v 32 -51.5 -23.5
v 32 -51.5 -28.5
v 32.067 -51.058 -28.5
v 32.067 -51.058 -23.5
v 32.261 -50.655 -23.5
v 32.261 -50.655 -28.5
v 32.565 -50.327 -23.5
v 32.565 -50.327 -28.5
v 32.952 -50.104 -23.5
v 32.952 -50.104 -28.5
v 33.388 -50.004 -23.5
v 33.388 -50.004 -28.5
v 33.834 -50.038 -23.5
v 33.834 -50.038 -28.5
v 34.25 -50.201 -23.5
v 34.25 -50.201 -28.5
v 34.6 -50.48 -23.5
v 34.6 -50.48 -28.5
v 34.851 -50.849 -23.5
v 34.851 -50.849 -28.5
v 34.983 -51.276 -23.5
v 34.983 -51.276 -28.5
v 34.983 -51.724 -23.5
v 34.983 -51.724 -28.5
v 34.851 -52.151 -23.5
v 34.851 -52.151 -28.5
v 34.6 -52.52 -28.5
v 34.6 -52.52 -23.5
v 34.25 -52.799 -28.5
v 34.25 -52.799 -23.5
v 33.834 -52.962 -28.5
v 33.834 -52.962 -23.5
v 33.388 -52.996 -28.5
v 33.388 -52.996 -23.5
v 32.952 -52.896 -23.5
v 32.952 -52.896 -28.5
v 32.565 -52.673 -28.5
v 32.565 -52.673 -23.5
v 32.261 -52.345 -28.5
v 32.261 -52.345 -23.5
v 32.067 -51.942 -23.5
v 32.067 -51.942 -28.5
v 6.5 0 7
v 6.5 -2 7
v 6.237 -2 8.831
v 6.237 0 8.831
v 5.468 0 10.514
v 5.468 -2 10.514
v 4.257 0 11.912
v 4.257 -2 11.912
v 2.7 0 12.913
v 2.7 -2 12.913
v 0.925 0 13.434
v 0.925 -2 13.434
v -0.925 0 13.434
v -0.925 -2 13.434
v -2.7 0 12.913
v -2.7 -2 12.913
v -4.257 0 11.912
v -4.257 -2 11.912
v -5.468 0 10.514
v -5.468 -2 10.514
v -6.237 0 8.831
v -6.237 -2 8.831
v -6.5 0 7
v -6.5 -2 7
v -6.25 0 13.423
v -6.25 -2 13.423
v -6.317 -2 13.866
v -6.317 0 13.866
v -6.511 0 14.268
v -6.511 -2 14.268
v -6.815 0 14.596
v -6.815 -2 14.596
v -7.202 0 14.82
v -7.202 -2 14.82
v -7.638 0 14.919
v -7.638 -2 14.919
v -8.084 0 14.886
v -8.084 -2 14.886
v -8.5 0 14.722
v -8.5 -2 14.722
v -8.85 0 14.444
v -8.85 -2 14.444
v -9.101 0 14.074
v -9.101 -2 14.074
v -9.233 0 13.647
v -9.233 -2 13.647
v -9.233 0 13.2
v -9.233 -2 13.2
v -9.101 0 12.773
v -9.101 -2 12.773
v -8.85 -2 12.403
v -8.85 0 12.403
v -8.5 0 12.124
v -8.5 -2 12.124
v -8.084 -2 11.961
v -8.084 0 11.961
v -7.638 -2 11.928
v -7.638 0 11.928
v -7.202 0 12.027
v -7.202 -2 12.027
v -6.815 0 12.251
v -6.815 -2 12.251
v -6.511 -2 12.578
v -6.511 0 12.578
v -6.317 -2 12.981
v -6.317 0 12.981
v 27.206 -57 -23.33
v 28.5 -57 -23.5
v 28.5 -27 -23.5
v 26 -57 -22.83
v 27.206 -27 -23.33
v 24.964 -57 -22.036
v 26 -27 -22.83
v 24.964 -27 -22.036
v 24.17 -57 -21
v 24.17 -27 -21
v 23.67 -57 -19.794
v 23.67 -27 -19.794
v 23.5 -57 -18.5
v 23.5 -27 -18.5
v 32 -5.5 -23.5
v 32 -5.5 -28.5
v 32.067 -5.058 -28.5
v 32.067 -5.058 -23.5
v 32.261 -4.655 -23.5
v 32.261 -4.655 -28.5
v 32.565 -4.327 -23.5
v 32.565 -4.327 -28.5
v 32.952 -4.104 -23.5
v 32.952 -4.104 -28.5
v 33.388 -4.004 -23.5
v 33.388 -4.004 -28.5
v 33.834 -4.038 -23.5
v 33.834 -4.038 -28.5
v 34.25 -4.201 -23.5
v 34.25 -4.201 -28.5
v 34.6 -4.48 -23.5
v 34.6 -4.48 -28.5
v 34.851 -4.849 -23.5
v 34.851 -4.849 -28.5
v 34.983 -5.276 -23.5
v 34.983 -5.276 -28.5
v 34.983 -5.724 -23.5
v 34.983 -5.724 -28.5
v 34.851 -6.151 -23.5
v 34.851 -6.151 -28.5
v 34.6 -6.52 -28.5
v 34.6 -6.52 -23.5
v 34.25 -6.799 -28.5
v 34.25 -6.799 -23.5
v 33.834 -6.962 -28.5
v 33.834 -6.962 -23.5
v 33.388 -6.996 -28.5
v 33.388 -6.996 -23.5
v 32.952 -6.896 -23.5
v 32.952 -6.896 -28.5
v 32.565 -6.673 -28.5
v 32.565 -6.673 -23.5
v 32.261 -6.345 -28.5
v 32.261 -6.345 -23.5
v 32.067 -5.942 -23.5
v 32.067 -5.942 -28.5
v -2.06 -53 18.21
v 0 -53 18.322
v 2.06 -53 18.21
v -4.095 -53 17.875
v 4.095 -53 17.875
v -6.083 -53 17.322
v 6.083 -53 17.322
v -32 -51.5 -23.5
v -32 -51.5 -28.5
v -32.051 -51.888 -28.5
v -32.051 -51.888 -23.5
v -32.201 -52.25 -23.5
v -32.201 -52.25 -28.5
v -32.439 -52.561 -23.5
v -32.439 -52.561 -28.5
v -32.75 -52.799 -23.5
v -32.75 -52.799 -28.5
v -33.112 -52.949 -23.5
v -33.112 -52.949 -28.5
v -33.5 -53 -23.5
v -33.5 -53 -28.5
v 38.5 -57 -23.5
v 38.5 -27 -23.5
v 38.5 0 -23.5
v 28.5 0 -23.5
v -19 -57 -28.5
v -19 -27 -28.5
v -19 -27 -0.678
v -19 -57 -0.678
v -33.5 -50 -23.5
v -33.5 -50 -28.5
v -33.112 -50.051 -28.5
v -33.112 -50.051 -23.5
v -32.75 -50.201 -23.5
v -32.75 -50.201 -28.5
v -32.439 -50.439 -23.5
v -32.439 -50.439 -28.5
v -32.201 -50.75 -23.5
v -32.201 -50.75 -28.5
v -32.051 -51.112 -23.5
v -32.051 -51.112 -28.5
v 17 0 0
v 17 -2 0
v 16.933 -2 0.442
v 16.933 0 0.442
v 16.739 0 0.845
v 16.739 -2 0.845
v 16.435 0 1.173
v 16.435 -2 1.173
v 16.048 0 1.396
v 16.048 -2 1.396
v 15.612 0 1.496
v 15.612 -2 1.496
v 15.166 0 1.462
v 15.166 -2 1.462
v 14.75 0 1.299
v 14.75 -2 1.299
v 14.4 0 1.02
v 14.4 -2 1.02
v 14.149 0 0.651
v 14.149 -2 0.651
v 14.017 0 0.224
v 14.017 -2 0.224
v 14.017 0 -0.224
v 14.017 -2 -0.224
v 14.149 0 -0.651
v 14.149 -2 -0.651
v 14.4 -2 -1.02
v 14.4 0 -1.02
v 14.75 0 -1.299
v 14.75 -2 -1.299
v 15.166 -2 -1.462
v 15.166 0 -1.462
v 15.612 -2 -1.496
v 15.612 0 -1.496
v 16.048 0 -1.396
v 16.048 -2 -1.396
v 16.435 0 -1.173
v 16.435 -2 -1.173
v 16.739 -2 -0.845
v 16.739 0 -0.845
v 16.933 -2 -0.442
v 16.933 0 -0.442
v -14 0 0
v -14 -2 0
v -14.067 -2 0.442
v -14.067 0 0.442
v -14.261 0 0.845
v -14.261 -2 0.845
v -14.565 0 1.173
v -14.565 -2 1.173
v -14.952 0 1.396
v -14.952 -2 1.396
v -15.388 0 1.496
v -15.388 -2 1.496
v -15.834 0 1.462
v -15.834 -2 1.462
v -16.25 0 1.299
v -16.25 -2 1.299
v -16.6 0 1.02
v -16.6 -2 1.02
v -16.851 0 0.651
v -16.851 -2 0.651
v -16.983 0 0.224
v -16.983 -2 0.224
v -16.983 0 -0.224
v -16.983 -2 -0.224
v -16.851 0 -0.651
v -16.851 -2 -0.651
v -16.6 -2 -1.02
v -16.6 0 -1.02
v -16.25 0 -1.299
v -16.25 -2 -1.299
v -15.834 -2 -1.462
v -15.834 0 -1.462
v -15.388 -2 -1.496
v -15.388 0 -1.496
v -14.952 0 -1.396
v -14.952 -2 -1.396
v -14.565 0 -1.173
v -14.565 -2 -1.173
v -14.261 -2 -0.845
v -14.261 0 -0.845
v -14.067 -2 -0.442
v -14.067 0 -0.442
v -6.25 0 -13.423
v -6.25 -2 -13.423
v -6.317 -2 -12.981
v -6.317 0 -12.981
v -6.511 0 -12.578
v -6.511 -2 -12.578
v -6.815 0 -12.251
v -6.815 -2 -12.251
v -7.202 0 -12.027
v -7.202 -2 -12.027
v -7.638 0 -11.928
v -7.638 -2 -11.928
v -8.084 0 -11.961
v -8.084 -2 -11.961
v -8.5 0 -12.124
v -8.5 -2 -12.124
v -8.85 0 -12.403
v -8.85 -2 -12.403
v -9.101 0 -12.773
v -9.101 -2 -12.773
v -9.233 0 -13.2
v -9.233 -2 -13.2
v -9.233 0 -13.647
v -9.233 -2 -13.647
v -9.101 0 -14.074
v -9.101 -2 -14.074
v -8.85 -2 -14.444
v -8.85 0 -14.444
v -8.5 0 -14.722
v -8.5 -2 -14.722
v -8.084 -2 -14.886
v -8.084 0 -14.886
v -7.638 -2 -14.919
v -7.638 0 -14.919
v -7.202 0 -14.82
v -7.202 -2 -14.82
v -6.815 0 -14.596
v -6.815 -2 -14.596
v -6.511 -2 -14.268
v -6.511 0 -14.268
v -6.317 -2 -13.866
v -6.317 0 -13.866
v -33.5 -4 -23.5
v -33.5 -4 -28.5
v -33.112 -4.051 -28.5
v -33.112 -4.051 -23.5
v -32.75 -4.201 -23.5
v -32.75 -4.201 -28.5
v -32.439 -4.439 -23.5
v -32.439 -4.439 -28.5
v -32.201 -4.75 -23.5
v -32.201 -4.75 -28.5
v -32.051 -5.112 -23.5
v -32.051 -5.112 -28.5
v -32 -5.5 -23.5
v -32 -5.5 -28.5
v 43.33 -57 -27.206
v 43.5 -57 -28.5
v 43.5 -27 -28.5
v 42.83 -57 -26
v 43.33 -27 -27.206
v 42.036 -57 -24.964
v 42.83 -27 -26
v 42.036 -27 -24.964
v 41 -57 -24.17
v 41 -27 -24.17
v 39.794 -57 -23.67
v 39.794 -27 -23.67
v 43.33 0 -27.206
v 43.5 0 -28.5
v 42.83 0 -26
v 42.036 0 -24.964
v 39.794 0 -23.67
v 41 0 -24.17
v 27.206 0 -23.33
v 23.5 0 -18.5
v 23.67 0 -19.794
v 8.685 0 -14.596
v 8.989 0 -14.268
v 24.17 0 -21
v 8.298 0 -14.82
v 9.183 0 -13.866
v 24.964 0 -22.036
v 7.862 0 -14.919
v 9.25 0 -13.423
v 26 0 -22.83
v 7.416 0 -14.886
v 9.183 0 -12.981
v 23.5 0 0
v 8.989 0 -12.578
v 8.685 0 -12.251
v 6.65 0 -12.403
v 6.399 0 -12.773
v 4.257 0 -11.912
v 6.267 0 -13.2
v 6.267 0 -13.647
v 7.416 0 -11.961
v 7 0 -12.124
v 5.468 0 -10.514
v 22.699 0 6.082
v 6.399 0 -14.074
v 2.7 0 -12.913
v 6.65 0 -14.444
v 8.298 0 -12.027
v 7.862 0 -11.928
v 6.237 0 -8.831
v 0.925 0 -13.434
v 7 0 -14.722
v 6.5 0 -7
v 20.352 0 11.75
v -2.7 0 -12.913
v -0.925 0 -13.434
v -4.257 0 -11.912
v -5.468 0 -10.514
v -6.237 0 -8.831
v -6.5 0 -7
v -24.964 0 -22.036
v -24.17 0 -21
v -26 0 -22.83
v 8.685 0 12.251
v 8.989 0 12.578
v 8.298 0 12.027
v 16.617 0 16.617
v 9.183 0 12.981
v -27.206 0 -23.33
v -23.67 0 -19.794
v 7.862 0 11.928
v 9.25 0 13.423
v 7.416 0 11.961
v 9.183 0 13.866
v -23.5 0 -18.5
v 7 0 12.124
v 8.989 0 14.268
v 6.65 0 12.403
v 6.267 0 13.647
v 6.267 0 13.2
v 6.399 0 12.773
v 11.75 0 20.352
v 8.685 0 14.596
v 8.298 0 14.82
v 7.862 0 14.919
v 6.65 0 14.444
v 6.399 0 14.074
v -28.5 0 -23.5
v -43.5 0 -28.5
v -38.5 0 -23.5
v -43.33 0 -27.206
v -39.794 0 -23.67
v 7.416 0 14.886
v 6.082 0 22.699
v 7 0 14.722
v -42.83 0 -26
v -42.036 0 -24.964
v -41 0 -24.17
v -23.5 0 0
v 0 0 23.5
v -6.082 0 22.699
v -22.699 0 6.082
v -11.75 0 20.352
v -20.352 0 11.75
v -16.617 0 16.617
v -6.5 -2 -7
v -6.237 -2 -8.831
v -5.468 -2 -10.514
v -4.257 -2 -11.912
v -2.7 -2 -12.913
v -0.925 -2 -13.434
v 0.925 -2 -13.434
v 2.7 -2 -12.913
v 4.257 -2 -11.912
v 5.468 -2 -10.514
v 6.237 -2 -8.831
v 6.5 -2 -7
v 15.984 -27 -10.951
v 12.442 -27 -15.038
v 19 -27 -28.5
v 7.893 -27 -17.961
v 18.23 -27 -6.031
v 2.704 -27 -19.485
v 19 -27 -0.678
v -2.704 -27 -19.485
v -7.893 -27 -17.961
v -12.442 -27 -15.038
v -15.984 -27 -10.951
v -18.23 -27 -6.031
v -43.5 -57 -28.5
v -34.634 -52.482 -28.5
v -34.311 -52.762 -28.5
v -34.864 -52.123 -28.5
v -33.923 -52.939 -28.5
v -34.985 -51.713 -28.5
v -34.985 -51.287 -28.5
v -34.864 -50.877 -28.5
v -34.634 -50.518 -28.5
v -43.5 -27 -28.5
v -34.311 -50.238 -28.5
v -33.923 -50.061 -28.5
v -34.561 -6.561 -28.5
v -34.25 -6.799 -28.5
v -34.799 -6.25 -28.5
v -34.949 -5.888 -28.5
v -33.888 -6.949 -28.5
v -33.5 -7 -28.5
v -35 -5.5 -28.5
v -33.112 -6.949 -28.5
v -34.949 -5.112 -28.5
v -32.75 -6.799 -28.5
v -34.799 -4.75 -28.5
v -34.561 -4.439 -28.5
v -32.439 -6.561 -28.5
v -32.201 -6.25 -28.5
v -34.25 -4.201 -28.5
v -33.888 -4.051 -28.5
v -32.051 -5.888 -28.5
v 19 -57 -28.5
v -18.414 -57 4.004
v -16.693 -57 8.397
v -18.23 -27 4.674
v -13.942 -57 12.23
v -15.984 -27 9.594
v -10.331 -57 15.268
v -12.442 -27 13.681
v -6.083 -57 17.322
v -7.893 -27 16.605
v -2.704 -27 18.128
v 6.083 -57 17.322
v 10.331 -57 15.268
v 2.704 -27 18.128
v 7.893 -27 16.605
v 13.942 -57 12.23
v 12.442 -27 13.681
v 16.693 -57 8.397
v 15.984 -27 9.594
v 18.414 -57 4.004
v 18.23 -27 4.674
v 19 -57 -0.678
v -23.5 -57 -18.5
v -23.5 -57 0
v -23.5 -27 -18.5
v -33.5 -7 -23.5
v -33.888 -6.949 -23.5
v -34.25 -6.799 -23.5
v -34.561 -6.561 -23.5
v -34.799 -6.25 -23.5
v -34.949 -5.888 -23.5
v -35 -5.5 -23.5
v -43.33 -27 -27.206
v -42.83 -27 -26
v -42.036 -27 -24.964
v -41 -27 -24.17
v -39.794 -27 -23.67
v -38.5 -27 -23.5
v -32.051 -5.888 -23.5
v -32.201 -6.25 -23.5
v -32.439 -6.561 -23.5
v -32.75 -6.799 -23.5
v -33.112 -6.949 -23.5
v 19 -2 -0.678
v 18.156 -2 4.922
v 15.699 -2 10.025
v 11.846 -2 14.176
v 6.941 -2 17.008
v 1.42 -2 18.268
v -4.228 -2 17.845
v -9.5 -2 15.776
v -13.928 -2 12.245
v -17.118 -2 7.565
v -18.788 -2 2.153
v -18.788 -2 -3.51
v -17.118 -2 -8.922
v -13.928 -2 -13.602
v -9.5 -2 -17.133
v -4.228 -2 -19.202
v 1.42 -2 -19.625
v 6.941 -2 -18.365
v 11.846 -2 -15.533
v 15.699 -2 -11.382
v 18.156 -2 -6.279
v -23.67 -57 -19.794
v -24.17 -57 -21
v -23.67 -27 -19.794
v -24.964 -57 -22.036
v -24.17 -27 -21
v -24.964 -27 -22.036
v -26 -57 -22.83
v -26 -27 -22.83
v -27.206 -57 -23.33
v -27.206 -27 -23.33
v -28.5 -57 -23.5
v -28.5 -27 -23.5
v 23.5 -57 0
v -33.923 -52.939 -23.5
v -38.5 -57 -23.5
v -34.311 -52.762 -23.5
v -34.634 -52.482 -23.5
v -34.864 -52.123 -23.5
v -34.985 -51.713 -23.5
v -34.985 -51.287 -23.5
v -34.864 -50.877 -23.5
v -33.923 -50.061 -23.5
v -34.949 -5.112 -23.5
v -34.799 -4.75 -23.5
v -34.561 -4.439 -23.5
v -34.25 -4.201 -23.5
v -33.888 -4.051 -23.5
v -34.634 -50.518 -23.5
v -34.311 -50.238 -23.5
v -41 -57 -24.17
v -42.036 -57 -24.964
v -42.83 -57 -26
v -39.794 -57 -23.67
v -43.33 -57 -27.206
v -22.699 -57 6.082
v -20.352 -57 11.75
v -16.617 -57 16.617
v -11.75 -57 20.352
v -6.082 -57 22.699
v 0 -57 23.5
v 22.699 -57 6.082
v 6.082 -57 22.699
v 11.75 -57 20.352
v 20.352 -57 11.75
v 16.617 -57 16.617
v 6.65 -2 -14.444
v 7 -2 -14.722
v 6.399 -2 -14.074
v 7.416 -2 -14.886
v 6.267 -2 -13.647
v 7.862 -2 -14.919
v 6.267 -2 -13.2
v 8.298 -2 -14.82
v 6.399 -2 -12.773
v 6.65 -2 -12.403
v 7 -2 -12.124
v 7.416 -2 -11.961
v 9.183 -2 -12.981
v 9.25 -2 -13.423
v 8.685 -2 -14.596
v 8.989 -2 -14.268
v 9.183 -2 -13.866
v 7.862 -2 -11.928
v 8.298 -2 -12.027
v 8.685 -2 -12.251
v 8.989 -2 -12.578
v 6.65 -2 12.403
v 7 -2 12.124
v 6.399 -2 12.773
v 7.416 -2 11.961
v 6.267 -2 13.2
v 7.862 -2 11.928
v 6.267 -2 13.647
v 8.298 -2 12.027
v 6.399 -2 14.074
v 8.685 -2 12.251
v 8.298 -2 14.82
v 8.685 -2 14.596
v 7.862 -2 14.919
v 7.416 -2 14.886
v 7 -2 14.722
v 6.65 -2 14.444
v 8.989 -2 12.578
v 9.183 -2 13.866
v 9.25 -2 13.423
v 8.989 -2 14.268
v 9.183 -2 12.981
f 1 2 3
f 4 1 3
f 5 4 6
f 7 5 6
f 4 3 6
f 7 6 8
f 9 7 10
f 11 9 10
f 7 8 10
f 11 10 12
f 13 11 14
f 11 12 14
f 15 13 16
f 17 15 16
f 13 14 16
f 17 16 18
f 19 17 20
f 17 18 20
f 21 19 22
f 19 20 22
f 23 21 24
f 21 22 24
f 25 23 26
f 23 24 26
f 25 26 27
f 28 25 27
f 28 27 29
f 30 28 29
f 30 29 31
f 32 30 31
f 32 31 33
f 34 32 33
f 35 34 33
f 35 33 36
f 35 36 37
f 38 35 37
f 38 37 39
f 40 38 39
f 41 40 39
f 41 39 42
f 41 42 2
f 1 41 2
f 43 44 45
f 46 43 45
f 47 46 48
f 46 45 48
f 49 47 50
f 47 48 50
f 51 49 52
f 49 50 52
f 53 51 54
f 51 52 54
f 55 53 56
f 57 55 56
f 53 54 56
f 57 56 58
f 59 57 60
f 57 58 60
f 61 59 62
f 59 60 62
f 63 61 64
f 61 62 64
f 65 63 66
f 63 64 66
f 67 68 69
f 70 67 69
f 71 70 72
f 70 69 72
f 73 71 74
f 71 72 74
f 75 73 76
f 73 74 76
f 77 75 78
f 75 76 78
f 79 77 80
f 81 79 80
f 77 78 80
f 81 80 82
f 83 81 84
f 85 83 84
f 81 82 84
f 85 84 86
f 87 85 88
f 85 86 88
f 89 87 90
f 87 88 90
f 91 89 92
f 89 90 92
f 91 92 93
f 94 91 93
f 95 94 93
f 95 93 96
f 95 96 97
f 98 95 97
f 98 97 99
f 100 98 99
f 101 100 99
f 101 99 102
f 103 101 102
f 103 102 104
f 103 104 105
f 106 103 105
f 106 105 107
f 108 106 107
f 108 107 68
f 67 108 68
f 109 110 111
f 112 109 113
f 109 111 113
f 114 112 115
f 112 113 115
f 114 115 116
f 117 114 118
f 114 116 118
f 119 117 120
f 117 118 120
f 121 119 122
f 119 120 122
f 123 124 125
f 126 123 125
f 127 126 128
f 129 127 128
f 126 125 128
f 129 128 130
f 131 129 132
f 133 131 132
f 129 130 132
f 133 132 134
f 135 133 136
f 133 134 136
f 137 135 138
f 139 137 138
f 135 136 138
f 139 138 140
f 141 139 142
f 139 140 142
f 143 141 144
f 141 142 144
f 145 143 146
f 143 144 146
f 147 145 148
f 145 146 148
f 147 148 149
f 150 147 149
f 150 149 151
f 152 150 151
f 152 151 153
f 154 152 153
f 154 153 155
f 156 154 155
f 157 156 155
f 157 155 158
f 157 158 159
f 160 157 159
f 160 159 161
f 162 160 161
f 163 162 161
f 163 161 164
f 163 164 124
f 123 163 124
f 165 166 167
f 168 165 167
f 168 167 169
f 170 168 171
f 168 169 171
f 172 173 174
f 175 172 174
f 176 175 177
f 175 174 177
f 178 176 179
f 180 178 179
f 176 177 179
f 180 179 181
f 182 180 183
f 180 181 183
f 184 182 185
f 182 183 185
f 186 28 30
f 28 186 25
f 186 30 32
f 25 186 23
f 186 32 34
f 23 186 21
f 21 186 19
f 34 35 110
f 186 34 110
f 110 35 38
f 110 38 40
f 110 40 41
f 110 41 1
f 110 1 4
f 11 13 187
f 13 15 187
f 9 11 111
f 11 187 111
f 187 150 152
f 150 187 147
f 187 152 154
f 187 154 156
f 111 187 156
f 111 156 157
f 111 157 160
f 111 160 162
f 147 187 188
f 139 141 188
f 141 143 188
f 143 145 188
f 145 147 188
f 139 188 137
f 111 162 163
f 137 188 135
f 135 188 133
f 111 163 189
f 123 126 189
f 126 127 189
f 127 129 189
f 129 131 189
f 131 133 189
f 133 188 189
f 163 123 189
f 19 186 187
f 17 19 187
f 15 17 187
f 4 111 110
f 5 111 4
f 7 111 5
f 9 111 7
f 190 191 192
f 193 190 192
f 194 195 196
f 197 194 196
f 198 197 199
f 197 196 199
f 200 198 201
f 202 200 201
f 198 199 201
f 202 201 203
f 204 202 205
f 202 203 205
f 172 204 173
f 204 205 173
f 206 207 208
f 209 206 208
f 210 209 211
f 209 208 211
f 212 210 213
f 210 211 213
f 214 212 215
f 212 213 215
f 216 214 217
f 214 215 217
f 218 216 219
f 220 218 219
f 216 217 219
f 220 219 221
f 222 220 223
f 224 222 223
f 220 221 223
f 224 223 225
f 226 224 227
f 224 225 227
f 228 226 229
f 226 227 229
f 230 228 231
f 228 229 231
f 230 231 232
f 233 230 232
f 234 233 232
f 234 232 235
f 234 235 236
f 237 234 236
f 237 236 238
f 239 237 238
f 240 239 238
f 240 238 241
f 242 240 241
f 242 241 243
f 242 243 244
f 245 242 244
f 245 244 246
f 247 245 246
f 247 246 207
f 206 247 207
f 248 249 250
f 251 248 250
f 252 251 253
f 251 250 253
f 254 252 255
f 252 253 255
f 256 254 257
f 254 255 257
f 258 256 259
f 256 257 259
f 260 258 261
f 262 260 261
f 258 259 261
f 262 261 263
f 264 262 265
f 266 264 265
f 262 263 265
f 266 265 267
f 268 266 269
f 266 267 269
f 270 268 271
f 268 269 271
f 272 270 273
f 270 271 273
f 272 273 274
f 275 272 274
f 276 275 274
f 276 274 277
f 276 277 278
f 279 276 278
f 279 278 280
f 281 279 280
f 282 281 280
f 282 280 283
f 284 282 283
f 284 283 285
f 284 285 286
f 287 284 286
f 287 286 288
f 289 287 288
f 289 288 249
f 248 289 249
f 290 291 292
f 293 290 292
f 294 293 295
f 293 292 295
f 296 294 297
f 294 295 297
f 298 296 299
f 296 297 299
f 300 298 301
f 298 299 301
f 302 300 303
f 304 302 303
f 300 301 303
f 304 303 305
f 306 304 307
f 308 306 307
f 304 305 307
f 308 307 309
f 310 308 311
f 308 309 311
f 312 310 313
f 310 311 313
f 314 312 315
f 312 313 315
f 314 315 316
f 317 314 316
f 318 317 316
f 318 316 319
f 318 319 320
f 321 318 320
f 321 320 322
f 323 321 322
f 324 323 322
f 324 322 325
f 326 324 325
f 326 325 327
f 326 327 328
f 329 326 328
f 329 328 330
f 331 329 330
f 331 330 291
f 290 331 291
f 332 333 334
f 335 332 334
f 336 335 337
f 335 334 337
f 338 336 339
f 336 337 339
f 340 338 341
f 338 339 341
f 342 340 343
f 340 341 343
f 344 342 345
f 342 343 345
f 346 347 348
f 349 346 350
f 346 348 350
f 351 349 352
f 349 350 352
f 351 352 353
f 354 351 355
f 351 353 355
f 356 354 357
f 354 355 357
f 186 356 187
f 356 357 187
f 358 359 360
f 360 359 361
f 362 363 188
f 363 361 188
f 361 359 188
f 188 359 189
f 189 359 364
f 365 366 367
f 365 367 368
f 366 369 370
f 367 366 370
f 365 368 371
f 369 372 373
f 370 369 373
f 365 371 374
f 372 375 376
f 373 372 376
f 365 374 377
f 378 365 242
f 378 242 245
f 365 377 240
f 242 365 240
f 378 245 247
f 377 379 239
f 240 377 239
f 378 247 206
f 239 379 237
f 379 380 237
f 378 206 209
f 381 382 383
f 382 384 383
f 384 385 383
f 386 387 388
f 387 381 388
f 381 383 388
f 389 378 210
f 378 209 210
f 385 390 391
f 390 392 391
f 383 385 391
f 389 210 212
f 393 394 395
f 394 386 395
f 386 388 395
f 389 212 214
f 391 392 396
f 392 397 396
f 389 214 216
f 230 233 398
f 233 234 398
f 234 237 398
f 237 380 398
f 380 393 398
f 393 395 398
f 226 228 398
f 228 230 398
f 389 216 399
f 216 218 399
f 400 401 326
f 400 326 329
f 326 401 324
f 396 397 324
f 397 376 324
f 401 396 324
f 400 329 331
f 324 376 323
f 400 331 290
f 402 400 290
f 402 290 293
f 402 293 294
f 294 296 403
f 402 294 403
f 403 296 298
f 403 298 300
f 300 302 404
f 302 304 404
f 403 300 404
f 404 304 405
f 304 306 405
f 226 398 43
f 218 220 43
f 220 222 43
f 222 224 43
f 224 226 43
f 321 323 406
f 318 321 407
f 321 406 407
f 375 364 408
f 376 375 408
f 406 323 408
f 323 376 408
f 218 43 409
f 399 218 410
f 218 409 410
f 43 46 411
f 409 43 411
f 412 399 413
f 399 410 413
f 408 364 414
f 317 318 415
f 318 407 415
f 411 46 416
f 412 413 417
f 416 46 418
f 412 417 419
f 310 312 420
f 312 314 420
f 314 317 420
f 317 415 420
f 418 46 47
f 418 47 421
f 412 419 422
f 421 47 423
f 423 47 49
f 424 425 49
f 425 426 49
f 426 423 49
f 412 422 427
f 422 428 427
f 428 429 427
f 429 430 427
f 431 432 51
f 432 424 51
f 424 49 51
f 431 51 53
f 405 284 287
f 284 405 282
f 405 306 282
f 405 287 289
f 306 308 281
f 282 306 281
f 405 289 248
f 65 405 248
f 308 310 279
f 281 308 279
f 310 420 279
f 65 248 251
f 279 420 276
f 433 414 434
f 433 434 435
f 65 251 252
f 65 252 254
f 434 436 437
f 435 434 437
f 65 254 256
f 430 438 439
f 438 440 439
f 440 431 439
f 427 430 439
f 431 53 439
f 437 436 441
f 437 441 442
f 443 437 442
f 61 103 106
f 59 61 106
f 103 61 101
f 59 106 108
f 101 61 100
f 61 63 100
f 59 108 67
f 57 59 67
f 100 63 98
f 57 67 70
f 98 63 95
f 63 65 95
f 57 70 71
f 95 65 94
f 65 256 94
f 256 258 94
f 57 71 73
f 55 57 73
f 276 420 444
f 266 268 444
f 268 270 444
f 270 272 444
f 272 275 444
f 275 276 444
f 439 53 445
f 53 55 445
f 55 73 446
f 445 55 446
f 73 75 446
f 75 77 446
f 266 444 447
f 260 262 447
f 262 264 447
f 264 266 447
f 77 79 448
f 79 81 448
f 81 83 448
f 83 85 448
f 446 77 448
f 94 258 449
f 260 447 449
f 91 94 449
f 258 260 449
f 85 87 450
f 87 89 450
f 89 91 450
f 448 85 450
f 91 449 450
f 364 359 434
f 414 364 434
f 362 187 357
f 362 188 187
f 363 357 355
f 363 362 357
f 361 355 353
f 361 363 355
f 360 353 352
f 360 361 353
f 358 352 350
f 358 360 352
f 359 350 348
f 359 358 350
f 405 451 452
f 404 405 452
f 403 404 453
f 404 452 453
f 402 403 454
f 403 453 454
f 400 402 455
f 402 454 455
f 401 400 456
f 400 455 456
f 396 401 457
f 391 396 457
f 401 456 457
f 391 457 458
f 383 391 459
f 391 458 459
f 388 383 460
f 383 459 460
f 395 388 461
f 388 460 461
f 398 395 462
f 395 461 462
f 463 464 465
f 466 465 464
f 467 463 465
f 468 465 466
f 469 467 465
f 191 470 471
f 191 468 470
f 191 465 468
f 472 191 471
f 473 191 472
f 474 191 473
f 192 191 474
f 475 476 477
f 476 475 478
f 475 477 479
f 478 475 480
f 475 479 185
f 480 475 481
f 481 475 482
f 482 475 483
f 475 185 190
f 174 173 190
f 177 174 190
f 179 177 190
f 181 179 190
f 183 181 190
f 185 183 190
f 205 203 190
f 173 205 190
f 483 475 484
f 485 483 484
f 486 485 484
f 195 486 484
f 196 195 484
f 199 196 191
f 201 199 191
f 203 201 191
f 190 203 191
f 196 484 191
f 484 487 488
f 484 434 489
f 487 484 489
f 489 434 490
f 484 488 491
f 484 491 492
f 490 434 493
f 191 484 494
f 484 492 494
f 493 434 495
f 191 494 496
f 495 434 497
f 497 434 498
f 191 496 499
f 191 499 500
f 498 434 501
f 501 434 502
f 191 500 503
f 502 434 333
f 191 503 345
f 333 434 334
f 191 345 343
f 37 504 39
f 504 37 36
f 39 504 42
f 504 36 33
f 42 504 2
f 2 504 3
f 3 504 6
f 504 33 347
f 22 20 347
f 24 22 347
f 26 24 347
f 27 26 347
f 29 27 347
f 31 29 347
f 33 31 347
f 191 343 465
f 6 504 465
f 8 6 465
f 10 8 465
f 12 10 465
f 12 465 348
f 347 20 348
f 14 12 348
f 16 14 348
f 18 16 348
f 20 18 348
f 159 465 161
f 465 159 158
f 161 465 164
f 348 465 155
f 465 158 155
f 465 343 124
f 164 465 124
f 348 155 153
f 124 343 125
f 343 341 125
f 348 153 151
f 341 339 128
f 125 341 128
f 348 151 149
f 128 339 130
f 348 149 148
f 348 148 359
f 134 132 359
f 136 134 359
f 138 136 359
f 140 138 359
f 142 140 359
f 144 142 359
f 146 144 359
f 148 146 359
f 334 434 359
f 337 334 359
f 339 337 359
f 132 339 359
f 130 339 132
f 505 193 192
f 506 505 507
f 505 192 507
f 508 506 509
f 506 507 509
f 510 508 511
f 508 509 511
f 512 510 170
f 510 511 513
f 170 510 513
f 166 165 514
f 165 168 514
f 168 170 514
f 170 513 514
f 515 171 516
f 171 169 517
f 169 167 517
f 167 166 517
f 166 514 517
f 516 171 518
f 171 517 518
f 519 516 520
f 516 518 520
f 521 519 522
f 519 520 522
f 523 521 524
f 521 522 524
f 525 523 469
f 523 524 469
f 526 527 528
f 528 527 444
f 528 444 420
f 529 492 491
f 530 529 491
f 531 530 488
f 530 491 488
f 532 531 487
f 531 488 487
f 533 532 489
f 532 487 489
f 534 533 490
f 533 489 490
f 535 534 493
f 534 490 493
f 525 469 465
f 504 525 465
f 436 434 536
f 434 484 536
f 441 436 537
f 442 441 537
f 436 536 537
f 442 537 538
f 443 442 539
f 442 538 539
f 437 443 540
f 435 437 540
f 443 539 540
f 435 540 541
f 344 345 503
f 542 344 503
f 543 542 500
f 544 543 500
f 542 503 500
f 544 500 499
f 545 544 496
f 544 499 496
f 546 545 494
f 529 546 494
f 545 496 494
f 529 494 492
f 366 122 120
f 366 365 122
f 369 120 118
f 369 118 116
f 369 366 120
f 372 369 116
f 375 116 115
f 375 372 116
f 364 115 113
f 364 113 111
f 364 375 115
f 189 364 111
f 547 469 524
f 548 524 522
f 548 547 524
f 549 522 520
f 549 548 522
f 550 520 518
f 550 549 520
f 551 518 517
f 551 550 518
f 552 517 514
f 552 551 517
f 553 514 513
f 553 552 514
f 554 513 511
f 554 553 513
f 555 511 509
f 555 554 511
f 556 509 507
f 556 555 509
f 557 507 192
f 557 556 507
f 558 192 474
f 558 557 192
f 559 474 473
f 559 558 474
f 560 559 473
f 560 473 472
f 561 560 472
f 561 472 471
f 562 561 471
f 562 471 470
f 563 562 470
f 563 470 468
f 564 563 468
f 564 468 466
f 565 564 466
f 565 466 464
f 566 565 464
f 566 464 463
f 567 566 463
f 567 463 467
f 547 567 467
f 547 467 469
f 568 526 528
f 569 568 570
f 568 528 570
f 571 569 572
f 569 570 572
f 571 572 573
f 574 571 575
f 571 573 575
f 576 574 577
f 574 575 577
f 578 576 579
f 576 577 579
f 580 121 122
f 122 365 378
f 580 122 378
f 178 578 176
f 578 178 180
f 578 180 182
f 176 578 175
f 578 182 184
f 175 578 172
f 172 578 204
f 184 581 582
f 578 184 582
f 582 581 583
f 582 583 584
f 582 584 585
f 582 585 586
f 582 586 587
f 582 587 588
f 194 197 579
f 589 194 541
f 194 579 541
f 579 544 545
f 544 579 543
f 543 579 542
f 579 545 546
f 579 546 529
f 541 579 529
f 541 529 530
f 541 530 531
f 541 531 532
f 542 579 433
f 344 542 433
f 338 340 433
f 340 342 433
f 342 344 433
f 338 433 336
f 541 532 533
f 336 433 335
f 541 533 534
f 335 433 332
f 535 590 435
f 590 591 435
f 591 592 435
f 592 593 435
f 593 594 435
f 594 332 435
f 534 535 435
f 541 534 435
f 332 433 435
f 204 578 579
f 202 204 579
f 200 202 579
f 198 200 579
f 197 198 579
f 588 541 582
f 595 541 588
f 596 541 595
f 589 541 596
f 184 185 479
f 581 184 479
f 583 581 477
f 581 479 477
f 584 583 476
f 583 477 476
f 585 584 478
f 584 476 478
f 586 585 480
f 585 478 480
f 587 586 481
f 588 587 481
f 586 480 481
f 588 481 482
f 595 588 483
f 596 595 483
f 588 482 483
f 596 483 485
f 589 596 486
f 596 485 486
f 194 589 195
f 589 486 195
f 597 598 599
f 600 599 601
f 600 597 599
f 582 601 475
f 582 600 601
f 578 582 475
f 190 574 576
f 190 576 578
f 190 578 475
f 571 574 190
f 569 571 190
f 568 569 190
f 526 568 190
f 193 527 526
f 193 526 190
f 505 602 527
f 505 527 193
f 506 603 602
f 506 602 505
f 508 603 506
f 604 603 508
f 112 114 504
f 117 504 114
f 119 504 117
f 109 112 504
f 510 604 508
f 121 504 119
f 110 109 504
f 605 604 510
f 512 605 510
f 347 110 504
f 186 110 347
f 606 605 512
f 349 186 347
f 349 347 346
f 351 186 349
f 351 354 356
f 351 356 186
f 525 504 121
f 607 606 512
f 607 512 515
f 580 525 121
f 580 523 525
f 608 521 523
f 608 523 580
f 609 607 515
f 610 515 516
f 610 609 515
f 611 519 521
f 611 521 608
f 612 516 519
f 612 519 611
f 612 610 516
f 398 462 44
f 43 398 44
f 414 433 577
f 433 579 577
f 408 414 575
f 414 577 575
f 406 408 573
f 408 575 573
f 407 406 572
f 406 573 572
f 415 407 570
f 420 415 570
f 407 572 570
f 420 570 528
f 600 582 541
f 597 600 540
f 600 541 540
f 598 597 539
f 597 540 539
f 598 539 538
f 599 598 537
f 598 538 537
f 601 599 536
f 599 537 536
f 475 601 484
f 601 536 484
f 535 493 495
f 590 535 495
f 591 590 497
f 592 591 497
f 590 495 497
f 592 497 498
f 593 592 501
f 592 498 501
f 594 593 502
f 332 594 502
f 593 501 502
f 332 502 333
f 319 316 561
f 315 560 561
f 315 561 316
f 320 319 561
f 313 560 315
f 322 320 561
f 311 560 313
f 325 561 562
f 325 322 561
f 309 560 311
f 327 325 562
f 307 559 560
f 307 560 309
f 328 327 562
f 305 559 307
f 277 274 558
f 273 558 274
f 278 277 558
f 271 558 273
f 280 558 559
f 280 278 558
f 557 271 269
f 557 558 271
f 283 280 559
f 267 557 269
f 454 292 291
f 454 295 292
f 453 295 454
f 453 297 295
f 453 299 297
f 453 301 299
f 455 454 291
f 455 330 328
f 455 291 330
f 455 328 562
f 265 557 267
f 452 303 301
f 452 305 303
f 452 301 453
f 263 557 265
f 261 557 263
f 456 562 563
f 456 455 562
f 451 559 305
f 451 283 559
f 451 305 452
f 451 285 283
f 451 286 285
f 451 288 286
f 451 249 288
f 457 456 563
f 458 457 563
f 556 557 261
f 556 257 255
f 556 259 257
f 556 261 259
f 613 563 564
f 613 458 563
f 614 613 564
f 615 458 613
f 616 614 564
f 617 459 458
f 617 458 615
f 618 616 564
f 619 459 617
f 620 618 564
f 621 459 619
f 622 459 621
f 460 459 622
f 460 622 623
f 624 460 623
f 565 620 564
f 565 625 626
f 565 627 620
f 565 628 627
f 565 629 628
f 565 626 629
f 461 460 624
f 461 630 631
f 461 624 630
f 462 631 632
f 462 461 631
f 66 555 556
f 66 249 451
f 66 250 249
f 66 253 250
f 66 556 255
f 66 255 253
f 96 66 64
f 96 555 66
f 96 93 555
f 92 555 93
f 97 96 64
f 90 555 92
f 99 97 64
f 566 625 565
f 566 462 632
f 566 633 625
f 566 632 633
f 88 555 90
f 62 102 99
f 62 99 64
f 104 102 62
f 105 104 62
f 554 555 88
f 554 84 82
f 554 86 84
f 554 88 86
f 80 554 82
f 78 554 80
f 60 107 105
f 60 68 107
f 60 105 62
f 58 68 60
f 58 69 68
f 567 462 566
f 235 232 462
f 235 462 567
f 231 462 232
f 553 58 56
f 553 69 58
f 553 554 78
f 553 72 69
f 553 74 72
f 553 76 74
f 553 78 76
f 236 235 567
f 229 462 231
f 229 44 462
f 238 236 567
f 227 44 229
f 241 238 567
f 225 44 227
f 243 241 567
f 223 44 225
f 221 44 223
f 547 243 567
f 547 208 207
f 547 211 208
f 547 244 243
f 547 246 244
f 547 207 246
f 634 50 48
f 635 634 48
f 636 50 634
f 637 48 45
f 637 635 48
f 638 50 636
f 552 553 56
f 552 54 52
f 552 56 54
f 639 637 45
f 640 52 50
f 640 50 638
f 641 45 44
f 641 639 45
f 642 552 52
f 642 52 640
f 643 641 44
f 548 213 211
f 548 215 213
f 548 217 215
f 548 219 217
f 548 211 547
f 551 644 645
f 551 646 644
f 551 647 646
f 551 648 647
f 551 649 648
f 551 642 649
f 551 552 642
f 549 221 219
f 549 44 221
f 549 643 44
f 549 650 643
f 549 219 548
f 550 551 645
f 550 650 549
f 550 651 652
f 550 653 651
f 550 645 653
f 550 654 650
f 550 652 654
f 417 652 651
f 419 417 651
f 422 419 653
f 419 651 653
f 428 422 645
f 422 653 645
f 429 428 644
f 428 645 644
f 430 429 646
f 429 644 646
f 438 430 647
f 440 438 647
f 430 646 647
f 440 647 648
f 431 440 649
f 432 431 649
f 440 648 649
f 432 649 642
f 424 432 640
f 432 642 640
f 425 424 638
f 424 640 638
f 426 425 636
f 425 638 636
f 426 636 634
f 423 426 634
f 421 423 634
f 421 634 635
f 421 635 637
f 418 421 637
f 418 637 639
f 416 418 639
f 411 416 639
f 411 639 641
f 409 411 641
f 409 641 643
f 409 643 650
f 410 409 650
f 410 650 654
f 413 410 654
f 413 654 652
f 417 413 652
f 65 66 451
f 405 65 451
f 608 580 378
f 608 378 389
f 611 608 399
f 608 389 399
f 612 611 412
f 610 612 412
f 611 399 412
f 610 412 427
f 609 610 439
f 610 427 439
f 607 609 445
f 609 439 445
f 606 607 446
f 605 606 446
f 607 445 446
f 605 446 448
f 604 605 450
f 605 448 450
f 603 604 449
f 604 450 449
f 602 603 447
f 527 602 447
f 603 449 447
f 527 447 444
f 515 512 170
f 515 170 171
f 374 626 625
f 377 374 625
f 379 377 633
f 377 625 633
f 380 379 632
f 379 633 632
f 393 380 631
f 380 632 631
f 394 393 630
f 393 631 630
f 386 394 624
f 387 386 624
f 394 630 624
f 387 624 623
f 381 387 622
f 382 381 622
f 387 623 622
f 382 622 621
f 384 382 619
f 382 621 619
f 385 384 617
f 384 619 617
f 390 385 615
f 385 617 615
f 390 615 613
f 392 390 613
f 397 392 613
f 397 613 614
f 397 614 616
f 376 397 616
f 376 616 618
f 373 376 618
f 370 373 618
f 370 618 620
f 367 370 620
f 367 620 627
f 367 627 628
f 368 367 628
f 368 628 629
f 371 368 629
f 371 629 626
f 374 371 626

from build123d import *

# Parameters (mm, degrees)
F1_DEPTH  = 2
F2_R      = 1.5
F3_DEPTH  = 5
F4_R      = 19
F5_DEPTH  = 27
F6_W      = 47
F6_H      = 27
F7_DEPTH  = 5
F8_W      = 27
F8_H      = 5
F9_DEPTH  = 20
F10_W     = 27
F10_H     = 5
F11_DEPTH = 20
F12_R     = 4.99999
F14_DEPTH = 30
F16_DEPTH = 4
F18_DEPTH = 25


# Not quite as in the source:
# - a fillet or chamfer is up to 0.001 mm smaller than in the source, because OpenCascade refuses the exact size


with BuildPart() as f1:
    # F0 (on Front) → F1 (new body)
    with BuildSketch(Plane.XZ):
        with BuildLine():
            Line((-23.5, -23.5), (0, -23.5))
            Line((0, -23.5), (23.5, -23.5))
            Line((23.5, -23.5), (23.5, 0))
            ThreePointArc((23.5, 0), (0, 23.5), (-23.5, 0))
            Line((-23.5, 0), (-23.5, -23.5))
        make_face()
    extrude(amount=F1_DEPTH)

    # F2 (on face) → F3 (cut)
    with BuildSketch(Plane.XZ.offset(2)):
        with Locations((15.5, 0)):
            Circle(F2_R)
        with Locations((7.75, 13.4233937587)):
            Circle(F2_R)
        with Locations((-7.75, 13.4233937587)):
            Circle(F2_R)
        with Locations((-15.5, 0)):
            Circle(F2_R)
        with Locations((-7.75, -13.4233937587)):
            Circle(F2_R)
        with Locations((7.75, -13.4233937587)):
            Circle(F2_R)
        with BuildLine():
            Line((6.5, -7), (6.5, 7))
            ThreePointArc((6.5, 7), (0, 13.5), (-6.5, 7))
            Line((-6.5, 7), (-6.5, -7))
            ThreePointArc((-6.5, -7), (0, -13.5), (6.5, -7))
        make_face()
    extrude(amount=-F3_DEPTH, mode=Mode.SUBTRACT)

    # F4 (on Front) → F5 (join)
    with BuildSketch(Plane.XZ):
        with BuildLine():
            ThreePointArc((23.5, 0), (0, 23.5), (-23.5, 0))
            Line((-23.5, 0), (-23.5, -23.5))
            Line((-23.5, -23.5), (23.5, -23.5))
            Line((23.5, -23.5), (23.5, 0))
        make_face()
        with Locations((0, -0.6784388353)):
            Circle(F4_R, mode=Mode.SUBTRACT)
    extrude(amount=F5_DEPTH)

    # F6 (on face) → F7 (join)
    with BuildSketch(Plane(origin=(0, 0, -23.5), x_dir=(1, 0, 0), z_dir=(0, 0, -1))):
        with Locations((0, 13.5)):
            Rectangle(F6_W, F6_H)
    extrude(amount=F7_DEPTH)

    # F8 (on face) → F9 (join)
    with BuildSketch(Plane(origin=(-23.5, 0, 0), x_dir=(0, -1, 0), z_dir=(-1, 0, 0))):
        with Locations((13.5, -26)):
            Rectangle(F8_W, F8_H)
    extrude(amount=F9_DEPTH)

    # F10 (on face) → F11 (join)
    with BuildSketch(Plane.YZ.offset(23.5)):
        with Locations((-13.5, -26)):
            Rectangle(F10_W, F10_H)
    extrude(amount=F11_DEPTH)

    # F12 (radius 5 in the source; OpenCascade refuses exactly that, so slightly less here)
    f12_edges = [f1.edges().sort_by_distance(p)[0] for p in [
        (23.5, -13.5, -23.5),
        (43.5, -13.5, -23.5),
        (-23.5, -13.5, -23.5),
        (-43.5, -13.5, -23.5),
    ]]
    fillet(f12_edges, radius=F12_R)

    # F13 (on face) → F14 (join)
    with BuildSketch(Plane.XZ.offset(27)):
        with BuildLine():
            Line((23.5, -18.5), (23.5, 0))
            ThreePointArc((23.5, 0), (0, 23.5), (-23.5, 0))
            Line((-23.5, 0), (-23.5, -18.5))
            ThreePointArc((-23.5, -18.5), (-24.9644660941, -22.0355339059), (-28.5, -23.5))
            Line((-28.5, -23.5), (-38.5, -23.5))
            ThreePointArc((-38.5, -23.5), (-42.0355339059, -24.9644660941), (-43.5, -28.5))
            Line((-43.5, -28.5), (-19, -28.5))
            Line((-19, -28.5), (-19, -0.6784388353))
            ThreePointArc((-19, -0.6784388353), (0, 18.3215611647), (19, -0.6784388353))
            Line((19, -0.6784388353), (19, -28.5))
            Line((19, -28.5), (43.5, -28.5))
            ThreePointArc((43.5, -28.5), (42.0355339059, -24.9644660941), (38.5, -23.5))
            Line((38.5, -23.5), (28.5, -23.5))
            ThreePointArc((28.5, -23.5), (24.9644660941, -22.0355339059), (23.5, -18.5))
        make_face()
    extrude(amount=F14_DEPTH)

    # F15 (on face) → F16 (join)
    with BuildSketch(Plane.XZ.offset(57)):
        with BuildLine():
            ThreePointArc((6.0827625303, 17.3215611647), (3.0822070015, 18.0698944239), (0, 18.3215611647))
            Line((0, 18.3215611647), (0, 17.3215611647))
            Line((0, 17.3215611647), (6.0827625303, 17.3215611647))
        make_face()
        with BuildLine():
            Line((0, 17.3215611647), (0, 18.3215611647))
            ThreePointArc((0, 18.3215611647), (-3.0822070015, 18.0698944239), (-6.0827625303, 17.3215611647))
            Line((-6.0827625303, 17.3215611647), (0, 17.3215611647))
        make_face()
    extrude(amount=-F16_DEPTH)

    # F17 (on face) → F18 (cut)
    with BuildSketch(Plane(origin=(0, 0, -28.5), x_dir=(1, 0, 0), z_dir=(0, 0, -1))):
        with BuildLine():
            ThreePointArc((-35, 5.5), (-34.5606601718, 4.4393398282), (-33.5, 4))
            Line((-33.5, 4), (-33.5, 5.5))
            Line((-33.5, 5.5), (-35, 5.5))
        make_face()
        with BuildLine():
            ThreePointArc((35, 51.5), (33.5, 53), (32, 51.5))
            ThreePointArc((32, 51.5), (33.5, 50), (35, 51.5))
        make_face()
        with BuildLine():
            ThreePointArc((-33.5, 53), (-35, 51.5), (-33.5, 50))
            Line((-33.5, 50), (-33.5, 51.5))
            Line((-33.5, 51.5), (-33.5, 53))
        make_face()
        with BuildLine():
            Line((-33.5, 51.5), (-33.5, 50))
            ThreePointArc((-33.5, 50), (-32.4393398282, 50.4393398282), (-32, 51.5))
            Line((-32, 51.5), (-33.5, 51.5))
        make_face()
        with BuildLine():
            ThreePointArc((35, 5.5), (33.5, 7), (32, 5.5))
            ThreePointArc((32, 5.5), (33.5, 4), (35, 5.5))
        make_face()
        with BuildLine():
            Line((-33.5, 5.5), (-33.5, 4))
            ThreePointArc((-33.5, 4), (-32.4393398282, 4.4393398282), (-32, 5.5))
            Line((-32, 5.5), (-33.5, 5.5))
        make_face()
        with BuildLine():
            Line((-33.5, 7), (-33.5, 5.5))
            Line((-33.5, 5.5), (-32, 5.5))
            ThreePointArc((-32, 5.5), (-32.4393398282, 6.5606601718), (-33.5, 7))
        make_face()
        with BuildLine():
            Line((-35, 5.5), (-33.5, 5.5))
            Line((-33.5, 5.5), (-33.5, 7))
            ThreePointArc((-33.5, 7), (-34.5606601718, 6.5606601718), (-35, 5.5))
        make_face()
        with BuildLine():
            ThreePointArc((-32, 51.5), (-32.4393398282, 52.5606601718), (-33.5, 53))
            Line((-33.5, 53), (-33.5, 51.5))
            Line((-33.5, 51.5), (-32, 51.5))
        make_face()
    extrude(amount=-F18_DEPTH, mode=Mode.SUBTRACT)


solid = f1.part
